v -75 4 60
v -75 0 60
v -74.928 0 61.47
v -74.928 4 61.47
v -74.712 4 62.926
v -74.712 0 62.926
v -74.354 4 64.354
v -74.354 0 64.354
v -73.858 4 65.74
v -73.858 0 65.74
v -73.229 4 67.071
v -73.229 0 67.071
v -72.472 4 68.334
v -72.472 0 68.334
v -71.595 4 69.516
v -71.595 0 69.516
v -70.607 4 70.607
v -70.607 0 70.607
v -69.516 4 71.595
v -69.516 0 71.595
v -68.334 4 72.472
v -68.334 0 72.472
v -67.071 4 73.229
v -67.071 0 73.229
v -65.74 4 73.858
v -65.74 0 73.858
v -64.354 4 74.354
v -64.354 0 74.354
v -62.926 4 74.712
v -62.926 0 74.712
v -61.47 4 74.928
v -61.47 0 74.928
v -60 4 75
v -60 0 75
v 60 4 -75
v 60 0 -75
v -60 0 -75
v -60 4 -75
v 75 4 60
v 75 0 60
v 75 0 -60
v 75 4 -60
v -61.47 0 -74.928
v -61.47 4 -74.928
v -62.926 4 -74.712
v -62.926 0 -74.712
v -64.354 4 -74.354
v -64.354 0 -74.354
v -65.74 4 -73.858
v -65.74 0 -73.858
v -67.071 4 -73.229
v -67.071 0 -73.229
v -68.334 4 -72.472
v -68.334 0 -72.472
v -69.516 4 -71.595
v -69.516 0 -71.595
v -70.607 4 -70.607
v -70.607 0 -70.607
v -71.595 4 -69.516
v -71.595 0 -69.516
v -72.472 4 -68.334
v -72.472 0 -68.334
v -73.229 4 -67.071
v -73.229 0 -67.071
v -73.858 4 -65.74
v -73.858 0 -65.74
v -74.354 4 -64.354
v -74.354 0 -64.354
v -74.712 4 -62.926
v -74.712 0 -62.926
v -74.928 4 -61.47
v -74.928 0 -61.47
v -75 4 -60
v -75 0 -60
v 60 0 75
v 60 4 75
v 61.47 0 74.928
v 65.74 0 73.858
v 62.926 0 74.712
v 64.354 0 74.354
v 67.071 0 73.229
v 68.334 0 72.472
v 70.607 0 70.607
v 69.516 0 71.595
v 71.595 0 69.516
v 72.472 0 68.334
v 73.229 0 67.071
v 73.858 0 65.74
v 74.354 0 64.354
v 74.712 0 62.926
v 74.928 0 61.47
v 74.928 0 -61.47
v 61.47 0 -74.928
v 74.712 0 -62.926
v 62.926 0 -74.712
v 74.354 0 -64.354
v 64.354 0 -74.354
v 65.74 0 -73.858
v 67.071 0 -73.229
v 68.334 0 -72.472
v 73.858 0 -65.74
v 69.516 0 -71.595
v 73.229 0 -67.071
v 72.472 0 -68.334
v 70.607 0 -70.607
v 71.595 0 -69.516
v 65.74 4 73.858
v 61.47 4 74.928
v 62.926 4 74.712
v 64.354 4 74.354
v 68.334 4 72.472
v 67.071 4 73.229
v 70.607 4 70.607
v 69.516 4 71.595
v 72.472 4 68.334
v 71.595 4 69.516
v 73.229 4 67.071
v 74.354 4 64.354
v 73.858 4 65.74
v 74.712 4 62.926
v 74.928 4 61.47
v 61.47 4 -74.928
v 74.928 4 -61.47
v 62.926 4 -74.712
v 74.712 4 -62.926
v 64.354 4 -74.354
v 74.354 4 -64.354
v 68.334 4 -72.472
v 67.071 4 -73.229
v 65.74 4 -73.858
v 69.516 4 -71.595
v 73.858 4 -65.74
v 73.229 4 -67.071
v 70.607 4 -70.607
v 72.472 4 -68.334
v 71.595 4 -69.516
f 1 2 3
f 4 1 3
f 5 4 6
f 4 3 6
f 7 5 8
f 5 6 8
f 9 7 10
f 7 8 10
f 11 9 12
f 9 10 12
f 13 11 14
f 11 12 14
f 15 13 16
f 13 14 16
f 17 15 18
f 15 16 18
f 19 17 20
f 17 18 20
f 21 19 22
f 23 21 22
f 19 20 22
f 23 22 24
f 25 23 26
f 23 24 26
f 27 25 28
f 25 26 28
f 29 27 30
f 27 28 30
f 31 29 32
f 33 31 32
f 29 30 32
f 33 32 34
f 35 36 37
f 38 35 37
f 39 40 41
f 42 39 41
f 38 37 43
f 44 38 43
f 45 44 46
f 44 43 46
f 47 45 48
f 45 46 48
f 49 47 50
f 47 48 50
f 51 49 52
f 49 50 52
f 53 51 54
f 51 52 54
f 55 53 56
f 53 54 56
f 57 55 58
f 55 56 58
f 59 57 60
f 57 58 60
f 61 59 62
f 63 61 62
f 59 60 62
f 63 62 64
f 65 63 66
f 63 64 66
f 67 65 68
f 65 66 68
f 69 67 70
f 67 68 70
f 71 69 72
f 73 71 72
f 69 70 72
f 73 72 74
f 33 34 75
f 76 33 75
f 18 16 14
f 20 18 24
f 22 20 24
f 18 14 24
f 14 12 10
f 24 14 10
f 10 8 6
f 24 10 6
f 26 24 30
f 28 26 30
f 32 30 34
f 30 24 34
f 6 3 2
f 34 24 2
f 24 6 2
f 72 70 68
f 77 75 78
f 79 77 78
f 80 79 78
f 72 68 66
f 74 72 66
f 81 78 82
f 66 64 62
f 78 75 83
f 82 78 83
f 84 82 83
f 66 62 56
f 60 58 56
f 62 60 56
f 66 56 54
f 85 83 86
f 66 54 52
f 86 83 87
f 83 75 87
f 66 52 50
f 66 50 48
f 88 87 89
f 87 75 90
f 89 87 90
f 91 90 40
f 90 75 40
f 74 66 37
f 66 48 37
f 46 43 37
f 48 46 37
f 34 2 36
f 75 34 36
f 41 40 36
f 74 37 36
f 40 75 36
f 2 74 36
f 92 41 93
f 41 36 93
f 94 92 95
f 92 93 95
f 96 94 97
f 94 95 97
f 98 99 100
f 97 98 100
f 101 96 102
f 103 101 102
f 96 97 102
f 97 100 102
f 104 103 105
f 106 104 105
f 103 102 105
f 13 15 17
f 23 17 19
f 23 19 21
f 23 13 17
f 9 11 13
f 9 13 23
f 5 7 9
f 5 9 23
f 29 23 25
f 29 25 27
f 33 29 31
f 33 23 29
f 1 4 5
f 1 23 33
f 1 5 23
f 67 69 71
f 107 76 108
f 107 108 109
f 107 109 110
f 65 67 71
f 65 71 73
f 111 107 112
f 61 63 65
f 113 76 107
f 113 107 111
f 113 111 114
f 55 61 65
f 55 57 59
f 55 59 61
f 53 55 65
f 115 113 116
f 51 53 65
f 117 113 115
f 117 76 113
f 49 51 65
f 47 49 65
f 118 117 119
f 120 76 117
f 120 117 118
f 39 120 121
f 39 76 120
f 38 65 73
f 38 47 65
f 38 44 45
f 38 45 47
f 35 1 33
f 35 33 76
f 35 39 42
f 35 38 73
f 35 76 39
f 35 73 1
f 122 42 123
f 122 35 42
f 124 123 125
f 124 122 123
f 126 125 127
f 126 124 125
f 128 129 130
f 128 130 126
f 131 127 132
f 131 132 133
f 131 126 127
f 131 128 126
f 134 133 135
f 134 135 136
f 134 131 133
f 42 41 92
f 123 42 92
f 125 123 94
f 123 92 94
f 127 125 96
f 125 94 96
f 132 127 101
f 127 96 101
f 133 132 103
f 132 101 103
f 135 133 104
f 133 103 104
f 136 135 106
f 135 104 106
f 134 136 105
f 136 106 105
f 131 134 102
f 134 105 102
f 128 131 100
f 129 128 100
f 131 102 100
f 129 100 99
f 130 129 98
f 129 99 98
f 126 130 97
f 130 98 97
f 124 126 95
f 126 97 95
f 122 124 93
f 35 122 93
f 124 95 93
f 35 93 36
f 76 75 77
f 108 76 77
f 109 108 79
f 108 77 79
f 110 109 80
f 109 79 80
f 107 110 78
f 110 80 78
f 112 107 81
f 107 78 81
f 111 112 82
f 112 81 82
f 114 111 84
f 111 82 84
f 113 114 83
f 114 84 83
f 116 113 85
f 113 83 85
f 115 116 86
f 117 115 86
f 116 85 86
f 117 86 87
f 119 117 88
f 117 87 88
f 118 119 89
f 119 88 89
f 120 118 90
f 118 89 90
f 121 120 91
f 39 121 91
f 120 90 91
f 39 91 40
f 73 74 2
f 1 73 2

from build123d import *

# Parameters (mm, degrees)
BOSS_EXTRUDE3_DEPTH = 4


with BuildPart() as part:
    # Sketch1 → Boss-Extrude3 (new body)
    with BuildSketch(Plane(origin=(0, 0, 0), x_dir=(1, 0, 0), z_dir=(0, 1, 0))):
        with BuildLine():
            ThreePointArc((-75, -60), (-70.606601718, -70.606601718), (-60, -75))
            Line((-60, -75), (60, -75))
            ThreePointArc((60, -75), (70.606601718, -70.606601718), (75, -60))
            Line((75, -60), (75, 60))
            ThreePointArc((75, 60), (70.606601718, 70.606601718), (60, 75))
            Line((60, 75), (-60, 75))
            ThreePointArc((-60, 75), (-70.606601718, 70.606601718), (-75, 60))
            Line((-75, 60), (-75, -60))
        make_face()
    extrude(amount=BOSS_EXTRUDE3_DEPTH)


solid = part.part
